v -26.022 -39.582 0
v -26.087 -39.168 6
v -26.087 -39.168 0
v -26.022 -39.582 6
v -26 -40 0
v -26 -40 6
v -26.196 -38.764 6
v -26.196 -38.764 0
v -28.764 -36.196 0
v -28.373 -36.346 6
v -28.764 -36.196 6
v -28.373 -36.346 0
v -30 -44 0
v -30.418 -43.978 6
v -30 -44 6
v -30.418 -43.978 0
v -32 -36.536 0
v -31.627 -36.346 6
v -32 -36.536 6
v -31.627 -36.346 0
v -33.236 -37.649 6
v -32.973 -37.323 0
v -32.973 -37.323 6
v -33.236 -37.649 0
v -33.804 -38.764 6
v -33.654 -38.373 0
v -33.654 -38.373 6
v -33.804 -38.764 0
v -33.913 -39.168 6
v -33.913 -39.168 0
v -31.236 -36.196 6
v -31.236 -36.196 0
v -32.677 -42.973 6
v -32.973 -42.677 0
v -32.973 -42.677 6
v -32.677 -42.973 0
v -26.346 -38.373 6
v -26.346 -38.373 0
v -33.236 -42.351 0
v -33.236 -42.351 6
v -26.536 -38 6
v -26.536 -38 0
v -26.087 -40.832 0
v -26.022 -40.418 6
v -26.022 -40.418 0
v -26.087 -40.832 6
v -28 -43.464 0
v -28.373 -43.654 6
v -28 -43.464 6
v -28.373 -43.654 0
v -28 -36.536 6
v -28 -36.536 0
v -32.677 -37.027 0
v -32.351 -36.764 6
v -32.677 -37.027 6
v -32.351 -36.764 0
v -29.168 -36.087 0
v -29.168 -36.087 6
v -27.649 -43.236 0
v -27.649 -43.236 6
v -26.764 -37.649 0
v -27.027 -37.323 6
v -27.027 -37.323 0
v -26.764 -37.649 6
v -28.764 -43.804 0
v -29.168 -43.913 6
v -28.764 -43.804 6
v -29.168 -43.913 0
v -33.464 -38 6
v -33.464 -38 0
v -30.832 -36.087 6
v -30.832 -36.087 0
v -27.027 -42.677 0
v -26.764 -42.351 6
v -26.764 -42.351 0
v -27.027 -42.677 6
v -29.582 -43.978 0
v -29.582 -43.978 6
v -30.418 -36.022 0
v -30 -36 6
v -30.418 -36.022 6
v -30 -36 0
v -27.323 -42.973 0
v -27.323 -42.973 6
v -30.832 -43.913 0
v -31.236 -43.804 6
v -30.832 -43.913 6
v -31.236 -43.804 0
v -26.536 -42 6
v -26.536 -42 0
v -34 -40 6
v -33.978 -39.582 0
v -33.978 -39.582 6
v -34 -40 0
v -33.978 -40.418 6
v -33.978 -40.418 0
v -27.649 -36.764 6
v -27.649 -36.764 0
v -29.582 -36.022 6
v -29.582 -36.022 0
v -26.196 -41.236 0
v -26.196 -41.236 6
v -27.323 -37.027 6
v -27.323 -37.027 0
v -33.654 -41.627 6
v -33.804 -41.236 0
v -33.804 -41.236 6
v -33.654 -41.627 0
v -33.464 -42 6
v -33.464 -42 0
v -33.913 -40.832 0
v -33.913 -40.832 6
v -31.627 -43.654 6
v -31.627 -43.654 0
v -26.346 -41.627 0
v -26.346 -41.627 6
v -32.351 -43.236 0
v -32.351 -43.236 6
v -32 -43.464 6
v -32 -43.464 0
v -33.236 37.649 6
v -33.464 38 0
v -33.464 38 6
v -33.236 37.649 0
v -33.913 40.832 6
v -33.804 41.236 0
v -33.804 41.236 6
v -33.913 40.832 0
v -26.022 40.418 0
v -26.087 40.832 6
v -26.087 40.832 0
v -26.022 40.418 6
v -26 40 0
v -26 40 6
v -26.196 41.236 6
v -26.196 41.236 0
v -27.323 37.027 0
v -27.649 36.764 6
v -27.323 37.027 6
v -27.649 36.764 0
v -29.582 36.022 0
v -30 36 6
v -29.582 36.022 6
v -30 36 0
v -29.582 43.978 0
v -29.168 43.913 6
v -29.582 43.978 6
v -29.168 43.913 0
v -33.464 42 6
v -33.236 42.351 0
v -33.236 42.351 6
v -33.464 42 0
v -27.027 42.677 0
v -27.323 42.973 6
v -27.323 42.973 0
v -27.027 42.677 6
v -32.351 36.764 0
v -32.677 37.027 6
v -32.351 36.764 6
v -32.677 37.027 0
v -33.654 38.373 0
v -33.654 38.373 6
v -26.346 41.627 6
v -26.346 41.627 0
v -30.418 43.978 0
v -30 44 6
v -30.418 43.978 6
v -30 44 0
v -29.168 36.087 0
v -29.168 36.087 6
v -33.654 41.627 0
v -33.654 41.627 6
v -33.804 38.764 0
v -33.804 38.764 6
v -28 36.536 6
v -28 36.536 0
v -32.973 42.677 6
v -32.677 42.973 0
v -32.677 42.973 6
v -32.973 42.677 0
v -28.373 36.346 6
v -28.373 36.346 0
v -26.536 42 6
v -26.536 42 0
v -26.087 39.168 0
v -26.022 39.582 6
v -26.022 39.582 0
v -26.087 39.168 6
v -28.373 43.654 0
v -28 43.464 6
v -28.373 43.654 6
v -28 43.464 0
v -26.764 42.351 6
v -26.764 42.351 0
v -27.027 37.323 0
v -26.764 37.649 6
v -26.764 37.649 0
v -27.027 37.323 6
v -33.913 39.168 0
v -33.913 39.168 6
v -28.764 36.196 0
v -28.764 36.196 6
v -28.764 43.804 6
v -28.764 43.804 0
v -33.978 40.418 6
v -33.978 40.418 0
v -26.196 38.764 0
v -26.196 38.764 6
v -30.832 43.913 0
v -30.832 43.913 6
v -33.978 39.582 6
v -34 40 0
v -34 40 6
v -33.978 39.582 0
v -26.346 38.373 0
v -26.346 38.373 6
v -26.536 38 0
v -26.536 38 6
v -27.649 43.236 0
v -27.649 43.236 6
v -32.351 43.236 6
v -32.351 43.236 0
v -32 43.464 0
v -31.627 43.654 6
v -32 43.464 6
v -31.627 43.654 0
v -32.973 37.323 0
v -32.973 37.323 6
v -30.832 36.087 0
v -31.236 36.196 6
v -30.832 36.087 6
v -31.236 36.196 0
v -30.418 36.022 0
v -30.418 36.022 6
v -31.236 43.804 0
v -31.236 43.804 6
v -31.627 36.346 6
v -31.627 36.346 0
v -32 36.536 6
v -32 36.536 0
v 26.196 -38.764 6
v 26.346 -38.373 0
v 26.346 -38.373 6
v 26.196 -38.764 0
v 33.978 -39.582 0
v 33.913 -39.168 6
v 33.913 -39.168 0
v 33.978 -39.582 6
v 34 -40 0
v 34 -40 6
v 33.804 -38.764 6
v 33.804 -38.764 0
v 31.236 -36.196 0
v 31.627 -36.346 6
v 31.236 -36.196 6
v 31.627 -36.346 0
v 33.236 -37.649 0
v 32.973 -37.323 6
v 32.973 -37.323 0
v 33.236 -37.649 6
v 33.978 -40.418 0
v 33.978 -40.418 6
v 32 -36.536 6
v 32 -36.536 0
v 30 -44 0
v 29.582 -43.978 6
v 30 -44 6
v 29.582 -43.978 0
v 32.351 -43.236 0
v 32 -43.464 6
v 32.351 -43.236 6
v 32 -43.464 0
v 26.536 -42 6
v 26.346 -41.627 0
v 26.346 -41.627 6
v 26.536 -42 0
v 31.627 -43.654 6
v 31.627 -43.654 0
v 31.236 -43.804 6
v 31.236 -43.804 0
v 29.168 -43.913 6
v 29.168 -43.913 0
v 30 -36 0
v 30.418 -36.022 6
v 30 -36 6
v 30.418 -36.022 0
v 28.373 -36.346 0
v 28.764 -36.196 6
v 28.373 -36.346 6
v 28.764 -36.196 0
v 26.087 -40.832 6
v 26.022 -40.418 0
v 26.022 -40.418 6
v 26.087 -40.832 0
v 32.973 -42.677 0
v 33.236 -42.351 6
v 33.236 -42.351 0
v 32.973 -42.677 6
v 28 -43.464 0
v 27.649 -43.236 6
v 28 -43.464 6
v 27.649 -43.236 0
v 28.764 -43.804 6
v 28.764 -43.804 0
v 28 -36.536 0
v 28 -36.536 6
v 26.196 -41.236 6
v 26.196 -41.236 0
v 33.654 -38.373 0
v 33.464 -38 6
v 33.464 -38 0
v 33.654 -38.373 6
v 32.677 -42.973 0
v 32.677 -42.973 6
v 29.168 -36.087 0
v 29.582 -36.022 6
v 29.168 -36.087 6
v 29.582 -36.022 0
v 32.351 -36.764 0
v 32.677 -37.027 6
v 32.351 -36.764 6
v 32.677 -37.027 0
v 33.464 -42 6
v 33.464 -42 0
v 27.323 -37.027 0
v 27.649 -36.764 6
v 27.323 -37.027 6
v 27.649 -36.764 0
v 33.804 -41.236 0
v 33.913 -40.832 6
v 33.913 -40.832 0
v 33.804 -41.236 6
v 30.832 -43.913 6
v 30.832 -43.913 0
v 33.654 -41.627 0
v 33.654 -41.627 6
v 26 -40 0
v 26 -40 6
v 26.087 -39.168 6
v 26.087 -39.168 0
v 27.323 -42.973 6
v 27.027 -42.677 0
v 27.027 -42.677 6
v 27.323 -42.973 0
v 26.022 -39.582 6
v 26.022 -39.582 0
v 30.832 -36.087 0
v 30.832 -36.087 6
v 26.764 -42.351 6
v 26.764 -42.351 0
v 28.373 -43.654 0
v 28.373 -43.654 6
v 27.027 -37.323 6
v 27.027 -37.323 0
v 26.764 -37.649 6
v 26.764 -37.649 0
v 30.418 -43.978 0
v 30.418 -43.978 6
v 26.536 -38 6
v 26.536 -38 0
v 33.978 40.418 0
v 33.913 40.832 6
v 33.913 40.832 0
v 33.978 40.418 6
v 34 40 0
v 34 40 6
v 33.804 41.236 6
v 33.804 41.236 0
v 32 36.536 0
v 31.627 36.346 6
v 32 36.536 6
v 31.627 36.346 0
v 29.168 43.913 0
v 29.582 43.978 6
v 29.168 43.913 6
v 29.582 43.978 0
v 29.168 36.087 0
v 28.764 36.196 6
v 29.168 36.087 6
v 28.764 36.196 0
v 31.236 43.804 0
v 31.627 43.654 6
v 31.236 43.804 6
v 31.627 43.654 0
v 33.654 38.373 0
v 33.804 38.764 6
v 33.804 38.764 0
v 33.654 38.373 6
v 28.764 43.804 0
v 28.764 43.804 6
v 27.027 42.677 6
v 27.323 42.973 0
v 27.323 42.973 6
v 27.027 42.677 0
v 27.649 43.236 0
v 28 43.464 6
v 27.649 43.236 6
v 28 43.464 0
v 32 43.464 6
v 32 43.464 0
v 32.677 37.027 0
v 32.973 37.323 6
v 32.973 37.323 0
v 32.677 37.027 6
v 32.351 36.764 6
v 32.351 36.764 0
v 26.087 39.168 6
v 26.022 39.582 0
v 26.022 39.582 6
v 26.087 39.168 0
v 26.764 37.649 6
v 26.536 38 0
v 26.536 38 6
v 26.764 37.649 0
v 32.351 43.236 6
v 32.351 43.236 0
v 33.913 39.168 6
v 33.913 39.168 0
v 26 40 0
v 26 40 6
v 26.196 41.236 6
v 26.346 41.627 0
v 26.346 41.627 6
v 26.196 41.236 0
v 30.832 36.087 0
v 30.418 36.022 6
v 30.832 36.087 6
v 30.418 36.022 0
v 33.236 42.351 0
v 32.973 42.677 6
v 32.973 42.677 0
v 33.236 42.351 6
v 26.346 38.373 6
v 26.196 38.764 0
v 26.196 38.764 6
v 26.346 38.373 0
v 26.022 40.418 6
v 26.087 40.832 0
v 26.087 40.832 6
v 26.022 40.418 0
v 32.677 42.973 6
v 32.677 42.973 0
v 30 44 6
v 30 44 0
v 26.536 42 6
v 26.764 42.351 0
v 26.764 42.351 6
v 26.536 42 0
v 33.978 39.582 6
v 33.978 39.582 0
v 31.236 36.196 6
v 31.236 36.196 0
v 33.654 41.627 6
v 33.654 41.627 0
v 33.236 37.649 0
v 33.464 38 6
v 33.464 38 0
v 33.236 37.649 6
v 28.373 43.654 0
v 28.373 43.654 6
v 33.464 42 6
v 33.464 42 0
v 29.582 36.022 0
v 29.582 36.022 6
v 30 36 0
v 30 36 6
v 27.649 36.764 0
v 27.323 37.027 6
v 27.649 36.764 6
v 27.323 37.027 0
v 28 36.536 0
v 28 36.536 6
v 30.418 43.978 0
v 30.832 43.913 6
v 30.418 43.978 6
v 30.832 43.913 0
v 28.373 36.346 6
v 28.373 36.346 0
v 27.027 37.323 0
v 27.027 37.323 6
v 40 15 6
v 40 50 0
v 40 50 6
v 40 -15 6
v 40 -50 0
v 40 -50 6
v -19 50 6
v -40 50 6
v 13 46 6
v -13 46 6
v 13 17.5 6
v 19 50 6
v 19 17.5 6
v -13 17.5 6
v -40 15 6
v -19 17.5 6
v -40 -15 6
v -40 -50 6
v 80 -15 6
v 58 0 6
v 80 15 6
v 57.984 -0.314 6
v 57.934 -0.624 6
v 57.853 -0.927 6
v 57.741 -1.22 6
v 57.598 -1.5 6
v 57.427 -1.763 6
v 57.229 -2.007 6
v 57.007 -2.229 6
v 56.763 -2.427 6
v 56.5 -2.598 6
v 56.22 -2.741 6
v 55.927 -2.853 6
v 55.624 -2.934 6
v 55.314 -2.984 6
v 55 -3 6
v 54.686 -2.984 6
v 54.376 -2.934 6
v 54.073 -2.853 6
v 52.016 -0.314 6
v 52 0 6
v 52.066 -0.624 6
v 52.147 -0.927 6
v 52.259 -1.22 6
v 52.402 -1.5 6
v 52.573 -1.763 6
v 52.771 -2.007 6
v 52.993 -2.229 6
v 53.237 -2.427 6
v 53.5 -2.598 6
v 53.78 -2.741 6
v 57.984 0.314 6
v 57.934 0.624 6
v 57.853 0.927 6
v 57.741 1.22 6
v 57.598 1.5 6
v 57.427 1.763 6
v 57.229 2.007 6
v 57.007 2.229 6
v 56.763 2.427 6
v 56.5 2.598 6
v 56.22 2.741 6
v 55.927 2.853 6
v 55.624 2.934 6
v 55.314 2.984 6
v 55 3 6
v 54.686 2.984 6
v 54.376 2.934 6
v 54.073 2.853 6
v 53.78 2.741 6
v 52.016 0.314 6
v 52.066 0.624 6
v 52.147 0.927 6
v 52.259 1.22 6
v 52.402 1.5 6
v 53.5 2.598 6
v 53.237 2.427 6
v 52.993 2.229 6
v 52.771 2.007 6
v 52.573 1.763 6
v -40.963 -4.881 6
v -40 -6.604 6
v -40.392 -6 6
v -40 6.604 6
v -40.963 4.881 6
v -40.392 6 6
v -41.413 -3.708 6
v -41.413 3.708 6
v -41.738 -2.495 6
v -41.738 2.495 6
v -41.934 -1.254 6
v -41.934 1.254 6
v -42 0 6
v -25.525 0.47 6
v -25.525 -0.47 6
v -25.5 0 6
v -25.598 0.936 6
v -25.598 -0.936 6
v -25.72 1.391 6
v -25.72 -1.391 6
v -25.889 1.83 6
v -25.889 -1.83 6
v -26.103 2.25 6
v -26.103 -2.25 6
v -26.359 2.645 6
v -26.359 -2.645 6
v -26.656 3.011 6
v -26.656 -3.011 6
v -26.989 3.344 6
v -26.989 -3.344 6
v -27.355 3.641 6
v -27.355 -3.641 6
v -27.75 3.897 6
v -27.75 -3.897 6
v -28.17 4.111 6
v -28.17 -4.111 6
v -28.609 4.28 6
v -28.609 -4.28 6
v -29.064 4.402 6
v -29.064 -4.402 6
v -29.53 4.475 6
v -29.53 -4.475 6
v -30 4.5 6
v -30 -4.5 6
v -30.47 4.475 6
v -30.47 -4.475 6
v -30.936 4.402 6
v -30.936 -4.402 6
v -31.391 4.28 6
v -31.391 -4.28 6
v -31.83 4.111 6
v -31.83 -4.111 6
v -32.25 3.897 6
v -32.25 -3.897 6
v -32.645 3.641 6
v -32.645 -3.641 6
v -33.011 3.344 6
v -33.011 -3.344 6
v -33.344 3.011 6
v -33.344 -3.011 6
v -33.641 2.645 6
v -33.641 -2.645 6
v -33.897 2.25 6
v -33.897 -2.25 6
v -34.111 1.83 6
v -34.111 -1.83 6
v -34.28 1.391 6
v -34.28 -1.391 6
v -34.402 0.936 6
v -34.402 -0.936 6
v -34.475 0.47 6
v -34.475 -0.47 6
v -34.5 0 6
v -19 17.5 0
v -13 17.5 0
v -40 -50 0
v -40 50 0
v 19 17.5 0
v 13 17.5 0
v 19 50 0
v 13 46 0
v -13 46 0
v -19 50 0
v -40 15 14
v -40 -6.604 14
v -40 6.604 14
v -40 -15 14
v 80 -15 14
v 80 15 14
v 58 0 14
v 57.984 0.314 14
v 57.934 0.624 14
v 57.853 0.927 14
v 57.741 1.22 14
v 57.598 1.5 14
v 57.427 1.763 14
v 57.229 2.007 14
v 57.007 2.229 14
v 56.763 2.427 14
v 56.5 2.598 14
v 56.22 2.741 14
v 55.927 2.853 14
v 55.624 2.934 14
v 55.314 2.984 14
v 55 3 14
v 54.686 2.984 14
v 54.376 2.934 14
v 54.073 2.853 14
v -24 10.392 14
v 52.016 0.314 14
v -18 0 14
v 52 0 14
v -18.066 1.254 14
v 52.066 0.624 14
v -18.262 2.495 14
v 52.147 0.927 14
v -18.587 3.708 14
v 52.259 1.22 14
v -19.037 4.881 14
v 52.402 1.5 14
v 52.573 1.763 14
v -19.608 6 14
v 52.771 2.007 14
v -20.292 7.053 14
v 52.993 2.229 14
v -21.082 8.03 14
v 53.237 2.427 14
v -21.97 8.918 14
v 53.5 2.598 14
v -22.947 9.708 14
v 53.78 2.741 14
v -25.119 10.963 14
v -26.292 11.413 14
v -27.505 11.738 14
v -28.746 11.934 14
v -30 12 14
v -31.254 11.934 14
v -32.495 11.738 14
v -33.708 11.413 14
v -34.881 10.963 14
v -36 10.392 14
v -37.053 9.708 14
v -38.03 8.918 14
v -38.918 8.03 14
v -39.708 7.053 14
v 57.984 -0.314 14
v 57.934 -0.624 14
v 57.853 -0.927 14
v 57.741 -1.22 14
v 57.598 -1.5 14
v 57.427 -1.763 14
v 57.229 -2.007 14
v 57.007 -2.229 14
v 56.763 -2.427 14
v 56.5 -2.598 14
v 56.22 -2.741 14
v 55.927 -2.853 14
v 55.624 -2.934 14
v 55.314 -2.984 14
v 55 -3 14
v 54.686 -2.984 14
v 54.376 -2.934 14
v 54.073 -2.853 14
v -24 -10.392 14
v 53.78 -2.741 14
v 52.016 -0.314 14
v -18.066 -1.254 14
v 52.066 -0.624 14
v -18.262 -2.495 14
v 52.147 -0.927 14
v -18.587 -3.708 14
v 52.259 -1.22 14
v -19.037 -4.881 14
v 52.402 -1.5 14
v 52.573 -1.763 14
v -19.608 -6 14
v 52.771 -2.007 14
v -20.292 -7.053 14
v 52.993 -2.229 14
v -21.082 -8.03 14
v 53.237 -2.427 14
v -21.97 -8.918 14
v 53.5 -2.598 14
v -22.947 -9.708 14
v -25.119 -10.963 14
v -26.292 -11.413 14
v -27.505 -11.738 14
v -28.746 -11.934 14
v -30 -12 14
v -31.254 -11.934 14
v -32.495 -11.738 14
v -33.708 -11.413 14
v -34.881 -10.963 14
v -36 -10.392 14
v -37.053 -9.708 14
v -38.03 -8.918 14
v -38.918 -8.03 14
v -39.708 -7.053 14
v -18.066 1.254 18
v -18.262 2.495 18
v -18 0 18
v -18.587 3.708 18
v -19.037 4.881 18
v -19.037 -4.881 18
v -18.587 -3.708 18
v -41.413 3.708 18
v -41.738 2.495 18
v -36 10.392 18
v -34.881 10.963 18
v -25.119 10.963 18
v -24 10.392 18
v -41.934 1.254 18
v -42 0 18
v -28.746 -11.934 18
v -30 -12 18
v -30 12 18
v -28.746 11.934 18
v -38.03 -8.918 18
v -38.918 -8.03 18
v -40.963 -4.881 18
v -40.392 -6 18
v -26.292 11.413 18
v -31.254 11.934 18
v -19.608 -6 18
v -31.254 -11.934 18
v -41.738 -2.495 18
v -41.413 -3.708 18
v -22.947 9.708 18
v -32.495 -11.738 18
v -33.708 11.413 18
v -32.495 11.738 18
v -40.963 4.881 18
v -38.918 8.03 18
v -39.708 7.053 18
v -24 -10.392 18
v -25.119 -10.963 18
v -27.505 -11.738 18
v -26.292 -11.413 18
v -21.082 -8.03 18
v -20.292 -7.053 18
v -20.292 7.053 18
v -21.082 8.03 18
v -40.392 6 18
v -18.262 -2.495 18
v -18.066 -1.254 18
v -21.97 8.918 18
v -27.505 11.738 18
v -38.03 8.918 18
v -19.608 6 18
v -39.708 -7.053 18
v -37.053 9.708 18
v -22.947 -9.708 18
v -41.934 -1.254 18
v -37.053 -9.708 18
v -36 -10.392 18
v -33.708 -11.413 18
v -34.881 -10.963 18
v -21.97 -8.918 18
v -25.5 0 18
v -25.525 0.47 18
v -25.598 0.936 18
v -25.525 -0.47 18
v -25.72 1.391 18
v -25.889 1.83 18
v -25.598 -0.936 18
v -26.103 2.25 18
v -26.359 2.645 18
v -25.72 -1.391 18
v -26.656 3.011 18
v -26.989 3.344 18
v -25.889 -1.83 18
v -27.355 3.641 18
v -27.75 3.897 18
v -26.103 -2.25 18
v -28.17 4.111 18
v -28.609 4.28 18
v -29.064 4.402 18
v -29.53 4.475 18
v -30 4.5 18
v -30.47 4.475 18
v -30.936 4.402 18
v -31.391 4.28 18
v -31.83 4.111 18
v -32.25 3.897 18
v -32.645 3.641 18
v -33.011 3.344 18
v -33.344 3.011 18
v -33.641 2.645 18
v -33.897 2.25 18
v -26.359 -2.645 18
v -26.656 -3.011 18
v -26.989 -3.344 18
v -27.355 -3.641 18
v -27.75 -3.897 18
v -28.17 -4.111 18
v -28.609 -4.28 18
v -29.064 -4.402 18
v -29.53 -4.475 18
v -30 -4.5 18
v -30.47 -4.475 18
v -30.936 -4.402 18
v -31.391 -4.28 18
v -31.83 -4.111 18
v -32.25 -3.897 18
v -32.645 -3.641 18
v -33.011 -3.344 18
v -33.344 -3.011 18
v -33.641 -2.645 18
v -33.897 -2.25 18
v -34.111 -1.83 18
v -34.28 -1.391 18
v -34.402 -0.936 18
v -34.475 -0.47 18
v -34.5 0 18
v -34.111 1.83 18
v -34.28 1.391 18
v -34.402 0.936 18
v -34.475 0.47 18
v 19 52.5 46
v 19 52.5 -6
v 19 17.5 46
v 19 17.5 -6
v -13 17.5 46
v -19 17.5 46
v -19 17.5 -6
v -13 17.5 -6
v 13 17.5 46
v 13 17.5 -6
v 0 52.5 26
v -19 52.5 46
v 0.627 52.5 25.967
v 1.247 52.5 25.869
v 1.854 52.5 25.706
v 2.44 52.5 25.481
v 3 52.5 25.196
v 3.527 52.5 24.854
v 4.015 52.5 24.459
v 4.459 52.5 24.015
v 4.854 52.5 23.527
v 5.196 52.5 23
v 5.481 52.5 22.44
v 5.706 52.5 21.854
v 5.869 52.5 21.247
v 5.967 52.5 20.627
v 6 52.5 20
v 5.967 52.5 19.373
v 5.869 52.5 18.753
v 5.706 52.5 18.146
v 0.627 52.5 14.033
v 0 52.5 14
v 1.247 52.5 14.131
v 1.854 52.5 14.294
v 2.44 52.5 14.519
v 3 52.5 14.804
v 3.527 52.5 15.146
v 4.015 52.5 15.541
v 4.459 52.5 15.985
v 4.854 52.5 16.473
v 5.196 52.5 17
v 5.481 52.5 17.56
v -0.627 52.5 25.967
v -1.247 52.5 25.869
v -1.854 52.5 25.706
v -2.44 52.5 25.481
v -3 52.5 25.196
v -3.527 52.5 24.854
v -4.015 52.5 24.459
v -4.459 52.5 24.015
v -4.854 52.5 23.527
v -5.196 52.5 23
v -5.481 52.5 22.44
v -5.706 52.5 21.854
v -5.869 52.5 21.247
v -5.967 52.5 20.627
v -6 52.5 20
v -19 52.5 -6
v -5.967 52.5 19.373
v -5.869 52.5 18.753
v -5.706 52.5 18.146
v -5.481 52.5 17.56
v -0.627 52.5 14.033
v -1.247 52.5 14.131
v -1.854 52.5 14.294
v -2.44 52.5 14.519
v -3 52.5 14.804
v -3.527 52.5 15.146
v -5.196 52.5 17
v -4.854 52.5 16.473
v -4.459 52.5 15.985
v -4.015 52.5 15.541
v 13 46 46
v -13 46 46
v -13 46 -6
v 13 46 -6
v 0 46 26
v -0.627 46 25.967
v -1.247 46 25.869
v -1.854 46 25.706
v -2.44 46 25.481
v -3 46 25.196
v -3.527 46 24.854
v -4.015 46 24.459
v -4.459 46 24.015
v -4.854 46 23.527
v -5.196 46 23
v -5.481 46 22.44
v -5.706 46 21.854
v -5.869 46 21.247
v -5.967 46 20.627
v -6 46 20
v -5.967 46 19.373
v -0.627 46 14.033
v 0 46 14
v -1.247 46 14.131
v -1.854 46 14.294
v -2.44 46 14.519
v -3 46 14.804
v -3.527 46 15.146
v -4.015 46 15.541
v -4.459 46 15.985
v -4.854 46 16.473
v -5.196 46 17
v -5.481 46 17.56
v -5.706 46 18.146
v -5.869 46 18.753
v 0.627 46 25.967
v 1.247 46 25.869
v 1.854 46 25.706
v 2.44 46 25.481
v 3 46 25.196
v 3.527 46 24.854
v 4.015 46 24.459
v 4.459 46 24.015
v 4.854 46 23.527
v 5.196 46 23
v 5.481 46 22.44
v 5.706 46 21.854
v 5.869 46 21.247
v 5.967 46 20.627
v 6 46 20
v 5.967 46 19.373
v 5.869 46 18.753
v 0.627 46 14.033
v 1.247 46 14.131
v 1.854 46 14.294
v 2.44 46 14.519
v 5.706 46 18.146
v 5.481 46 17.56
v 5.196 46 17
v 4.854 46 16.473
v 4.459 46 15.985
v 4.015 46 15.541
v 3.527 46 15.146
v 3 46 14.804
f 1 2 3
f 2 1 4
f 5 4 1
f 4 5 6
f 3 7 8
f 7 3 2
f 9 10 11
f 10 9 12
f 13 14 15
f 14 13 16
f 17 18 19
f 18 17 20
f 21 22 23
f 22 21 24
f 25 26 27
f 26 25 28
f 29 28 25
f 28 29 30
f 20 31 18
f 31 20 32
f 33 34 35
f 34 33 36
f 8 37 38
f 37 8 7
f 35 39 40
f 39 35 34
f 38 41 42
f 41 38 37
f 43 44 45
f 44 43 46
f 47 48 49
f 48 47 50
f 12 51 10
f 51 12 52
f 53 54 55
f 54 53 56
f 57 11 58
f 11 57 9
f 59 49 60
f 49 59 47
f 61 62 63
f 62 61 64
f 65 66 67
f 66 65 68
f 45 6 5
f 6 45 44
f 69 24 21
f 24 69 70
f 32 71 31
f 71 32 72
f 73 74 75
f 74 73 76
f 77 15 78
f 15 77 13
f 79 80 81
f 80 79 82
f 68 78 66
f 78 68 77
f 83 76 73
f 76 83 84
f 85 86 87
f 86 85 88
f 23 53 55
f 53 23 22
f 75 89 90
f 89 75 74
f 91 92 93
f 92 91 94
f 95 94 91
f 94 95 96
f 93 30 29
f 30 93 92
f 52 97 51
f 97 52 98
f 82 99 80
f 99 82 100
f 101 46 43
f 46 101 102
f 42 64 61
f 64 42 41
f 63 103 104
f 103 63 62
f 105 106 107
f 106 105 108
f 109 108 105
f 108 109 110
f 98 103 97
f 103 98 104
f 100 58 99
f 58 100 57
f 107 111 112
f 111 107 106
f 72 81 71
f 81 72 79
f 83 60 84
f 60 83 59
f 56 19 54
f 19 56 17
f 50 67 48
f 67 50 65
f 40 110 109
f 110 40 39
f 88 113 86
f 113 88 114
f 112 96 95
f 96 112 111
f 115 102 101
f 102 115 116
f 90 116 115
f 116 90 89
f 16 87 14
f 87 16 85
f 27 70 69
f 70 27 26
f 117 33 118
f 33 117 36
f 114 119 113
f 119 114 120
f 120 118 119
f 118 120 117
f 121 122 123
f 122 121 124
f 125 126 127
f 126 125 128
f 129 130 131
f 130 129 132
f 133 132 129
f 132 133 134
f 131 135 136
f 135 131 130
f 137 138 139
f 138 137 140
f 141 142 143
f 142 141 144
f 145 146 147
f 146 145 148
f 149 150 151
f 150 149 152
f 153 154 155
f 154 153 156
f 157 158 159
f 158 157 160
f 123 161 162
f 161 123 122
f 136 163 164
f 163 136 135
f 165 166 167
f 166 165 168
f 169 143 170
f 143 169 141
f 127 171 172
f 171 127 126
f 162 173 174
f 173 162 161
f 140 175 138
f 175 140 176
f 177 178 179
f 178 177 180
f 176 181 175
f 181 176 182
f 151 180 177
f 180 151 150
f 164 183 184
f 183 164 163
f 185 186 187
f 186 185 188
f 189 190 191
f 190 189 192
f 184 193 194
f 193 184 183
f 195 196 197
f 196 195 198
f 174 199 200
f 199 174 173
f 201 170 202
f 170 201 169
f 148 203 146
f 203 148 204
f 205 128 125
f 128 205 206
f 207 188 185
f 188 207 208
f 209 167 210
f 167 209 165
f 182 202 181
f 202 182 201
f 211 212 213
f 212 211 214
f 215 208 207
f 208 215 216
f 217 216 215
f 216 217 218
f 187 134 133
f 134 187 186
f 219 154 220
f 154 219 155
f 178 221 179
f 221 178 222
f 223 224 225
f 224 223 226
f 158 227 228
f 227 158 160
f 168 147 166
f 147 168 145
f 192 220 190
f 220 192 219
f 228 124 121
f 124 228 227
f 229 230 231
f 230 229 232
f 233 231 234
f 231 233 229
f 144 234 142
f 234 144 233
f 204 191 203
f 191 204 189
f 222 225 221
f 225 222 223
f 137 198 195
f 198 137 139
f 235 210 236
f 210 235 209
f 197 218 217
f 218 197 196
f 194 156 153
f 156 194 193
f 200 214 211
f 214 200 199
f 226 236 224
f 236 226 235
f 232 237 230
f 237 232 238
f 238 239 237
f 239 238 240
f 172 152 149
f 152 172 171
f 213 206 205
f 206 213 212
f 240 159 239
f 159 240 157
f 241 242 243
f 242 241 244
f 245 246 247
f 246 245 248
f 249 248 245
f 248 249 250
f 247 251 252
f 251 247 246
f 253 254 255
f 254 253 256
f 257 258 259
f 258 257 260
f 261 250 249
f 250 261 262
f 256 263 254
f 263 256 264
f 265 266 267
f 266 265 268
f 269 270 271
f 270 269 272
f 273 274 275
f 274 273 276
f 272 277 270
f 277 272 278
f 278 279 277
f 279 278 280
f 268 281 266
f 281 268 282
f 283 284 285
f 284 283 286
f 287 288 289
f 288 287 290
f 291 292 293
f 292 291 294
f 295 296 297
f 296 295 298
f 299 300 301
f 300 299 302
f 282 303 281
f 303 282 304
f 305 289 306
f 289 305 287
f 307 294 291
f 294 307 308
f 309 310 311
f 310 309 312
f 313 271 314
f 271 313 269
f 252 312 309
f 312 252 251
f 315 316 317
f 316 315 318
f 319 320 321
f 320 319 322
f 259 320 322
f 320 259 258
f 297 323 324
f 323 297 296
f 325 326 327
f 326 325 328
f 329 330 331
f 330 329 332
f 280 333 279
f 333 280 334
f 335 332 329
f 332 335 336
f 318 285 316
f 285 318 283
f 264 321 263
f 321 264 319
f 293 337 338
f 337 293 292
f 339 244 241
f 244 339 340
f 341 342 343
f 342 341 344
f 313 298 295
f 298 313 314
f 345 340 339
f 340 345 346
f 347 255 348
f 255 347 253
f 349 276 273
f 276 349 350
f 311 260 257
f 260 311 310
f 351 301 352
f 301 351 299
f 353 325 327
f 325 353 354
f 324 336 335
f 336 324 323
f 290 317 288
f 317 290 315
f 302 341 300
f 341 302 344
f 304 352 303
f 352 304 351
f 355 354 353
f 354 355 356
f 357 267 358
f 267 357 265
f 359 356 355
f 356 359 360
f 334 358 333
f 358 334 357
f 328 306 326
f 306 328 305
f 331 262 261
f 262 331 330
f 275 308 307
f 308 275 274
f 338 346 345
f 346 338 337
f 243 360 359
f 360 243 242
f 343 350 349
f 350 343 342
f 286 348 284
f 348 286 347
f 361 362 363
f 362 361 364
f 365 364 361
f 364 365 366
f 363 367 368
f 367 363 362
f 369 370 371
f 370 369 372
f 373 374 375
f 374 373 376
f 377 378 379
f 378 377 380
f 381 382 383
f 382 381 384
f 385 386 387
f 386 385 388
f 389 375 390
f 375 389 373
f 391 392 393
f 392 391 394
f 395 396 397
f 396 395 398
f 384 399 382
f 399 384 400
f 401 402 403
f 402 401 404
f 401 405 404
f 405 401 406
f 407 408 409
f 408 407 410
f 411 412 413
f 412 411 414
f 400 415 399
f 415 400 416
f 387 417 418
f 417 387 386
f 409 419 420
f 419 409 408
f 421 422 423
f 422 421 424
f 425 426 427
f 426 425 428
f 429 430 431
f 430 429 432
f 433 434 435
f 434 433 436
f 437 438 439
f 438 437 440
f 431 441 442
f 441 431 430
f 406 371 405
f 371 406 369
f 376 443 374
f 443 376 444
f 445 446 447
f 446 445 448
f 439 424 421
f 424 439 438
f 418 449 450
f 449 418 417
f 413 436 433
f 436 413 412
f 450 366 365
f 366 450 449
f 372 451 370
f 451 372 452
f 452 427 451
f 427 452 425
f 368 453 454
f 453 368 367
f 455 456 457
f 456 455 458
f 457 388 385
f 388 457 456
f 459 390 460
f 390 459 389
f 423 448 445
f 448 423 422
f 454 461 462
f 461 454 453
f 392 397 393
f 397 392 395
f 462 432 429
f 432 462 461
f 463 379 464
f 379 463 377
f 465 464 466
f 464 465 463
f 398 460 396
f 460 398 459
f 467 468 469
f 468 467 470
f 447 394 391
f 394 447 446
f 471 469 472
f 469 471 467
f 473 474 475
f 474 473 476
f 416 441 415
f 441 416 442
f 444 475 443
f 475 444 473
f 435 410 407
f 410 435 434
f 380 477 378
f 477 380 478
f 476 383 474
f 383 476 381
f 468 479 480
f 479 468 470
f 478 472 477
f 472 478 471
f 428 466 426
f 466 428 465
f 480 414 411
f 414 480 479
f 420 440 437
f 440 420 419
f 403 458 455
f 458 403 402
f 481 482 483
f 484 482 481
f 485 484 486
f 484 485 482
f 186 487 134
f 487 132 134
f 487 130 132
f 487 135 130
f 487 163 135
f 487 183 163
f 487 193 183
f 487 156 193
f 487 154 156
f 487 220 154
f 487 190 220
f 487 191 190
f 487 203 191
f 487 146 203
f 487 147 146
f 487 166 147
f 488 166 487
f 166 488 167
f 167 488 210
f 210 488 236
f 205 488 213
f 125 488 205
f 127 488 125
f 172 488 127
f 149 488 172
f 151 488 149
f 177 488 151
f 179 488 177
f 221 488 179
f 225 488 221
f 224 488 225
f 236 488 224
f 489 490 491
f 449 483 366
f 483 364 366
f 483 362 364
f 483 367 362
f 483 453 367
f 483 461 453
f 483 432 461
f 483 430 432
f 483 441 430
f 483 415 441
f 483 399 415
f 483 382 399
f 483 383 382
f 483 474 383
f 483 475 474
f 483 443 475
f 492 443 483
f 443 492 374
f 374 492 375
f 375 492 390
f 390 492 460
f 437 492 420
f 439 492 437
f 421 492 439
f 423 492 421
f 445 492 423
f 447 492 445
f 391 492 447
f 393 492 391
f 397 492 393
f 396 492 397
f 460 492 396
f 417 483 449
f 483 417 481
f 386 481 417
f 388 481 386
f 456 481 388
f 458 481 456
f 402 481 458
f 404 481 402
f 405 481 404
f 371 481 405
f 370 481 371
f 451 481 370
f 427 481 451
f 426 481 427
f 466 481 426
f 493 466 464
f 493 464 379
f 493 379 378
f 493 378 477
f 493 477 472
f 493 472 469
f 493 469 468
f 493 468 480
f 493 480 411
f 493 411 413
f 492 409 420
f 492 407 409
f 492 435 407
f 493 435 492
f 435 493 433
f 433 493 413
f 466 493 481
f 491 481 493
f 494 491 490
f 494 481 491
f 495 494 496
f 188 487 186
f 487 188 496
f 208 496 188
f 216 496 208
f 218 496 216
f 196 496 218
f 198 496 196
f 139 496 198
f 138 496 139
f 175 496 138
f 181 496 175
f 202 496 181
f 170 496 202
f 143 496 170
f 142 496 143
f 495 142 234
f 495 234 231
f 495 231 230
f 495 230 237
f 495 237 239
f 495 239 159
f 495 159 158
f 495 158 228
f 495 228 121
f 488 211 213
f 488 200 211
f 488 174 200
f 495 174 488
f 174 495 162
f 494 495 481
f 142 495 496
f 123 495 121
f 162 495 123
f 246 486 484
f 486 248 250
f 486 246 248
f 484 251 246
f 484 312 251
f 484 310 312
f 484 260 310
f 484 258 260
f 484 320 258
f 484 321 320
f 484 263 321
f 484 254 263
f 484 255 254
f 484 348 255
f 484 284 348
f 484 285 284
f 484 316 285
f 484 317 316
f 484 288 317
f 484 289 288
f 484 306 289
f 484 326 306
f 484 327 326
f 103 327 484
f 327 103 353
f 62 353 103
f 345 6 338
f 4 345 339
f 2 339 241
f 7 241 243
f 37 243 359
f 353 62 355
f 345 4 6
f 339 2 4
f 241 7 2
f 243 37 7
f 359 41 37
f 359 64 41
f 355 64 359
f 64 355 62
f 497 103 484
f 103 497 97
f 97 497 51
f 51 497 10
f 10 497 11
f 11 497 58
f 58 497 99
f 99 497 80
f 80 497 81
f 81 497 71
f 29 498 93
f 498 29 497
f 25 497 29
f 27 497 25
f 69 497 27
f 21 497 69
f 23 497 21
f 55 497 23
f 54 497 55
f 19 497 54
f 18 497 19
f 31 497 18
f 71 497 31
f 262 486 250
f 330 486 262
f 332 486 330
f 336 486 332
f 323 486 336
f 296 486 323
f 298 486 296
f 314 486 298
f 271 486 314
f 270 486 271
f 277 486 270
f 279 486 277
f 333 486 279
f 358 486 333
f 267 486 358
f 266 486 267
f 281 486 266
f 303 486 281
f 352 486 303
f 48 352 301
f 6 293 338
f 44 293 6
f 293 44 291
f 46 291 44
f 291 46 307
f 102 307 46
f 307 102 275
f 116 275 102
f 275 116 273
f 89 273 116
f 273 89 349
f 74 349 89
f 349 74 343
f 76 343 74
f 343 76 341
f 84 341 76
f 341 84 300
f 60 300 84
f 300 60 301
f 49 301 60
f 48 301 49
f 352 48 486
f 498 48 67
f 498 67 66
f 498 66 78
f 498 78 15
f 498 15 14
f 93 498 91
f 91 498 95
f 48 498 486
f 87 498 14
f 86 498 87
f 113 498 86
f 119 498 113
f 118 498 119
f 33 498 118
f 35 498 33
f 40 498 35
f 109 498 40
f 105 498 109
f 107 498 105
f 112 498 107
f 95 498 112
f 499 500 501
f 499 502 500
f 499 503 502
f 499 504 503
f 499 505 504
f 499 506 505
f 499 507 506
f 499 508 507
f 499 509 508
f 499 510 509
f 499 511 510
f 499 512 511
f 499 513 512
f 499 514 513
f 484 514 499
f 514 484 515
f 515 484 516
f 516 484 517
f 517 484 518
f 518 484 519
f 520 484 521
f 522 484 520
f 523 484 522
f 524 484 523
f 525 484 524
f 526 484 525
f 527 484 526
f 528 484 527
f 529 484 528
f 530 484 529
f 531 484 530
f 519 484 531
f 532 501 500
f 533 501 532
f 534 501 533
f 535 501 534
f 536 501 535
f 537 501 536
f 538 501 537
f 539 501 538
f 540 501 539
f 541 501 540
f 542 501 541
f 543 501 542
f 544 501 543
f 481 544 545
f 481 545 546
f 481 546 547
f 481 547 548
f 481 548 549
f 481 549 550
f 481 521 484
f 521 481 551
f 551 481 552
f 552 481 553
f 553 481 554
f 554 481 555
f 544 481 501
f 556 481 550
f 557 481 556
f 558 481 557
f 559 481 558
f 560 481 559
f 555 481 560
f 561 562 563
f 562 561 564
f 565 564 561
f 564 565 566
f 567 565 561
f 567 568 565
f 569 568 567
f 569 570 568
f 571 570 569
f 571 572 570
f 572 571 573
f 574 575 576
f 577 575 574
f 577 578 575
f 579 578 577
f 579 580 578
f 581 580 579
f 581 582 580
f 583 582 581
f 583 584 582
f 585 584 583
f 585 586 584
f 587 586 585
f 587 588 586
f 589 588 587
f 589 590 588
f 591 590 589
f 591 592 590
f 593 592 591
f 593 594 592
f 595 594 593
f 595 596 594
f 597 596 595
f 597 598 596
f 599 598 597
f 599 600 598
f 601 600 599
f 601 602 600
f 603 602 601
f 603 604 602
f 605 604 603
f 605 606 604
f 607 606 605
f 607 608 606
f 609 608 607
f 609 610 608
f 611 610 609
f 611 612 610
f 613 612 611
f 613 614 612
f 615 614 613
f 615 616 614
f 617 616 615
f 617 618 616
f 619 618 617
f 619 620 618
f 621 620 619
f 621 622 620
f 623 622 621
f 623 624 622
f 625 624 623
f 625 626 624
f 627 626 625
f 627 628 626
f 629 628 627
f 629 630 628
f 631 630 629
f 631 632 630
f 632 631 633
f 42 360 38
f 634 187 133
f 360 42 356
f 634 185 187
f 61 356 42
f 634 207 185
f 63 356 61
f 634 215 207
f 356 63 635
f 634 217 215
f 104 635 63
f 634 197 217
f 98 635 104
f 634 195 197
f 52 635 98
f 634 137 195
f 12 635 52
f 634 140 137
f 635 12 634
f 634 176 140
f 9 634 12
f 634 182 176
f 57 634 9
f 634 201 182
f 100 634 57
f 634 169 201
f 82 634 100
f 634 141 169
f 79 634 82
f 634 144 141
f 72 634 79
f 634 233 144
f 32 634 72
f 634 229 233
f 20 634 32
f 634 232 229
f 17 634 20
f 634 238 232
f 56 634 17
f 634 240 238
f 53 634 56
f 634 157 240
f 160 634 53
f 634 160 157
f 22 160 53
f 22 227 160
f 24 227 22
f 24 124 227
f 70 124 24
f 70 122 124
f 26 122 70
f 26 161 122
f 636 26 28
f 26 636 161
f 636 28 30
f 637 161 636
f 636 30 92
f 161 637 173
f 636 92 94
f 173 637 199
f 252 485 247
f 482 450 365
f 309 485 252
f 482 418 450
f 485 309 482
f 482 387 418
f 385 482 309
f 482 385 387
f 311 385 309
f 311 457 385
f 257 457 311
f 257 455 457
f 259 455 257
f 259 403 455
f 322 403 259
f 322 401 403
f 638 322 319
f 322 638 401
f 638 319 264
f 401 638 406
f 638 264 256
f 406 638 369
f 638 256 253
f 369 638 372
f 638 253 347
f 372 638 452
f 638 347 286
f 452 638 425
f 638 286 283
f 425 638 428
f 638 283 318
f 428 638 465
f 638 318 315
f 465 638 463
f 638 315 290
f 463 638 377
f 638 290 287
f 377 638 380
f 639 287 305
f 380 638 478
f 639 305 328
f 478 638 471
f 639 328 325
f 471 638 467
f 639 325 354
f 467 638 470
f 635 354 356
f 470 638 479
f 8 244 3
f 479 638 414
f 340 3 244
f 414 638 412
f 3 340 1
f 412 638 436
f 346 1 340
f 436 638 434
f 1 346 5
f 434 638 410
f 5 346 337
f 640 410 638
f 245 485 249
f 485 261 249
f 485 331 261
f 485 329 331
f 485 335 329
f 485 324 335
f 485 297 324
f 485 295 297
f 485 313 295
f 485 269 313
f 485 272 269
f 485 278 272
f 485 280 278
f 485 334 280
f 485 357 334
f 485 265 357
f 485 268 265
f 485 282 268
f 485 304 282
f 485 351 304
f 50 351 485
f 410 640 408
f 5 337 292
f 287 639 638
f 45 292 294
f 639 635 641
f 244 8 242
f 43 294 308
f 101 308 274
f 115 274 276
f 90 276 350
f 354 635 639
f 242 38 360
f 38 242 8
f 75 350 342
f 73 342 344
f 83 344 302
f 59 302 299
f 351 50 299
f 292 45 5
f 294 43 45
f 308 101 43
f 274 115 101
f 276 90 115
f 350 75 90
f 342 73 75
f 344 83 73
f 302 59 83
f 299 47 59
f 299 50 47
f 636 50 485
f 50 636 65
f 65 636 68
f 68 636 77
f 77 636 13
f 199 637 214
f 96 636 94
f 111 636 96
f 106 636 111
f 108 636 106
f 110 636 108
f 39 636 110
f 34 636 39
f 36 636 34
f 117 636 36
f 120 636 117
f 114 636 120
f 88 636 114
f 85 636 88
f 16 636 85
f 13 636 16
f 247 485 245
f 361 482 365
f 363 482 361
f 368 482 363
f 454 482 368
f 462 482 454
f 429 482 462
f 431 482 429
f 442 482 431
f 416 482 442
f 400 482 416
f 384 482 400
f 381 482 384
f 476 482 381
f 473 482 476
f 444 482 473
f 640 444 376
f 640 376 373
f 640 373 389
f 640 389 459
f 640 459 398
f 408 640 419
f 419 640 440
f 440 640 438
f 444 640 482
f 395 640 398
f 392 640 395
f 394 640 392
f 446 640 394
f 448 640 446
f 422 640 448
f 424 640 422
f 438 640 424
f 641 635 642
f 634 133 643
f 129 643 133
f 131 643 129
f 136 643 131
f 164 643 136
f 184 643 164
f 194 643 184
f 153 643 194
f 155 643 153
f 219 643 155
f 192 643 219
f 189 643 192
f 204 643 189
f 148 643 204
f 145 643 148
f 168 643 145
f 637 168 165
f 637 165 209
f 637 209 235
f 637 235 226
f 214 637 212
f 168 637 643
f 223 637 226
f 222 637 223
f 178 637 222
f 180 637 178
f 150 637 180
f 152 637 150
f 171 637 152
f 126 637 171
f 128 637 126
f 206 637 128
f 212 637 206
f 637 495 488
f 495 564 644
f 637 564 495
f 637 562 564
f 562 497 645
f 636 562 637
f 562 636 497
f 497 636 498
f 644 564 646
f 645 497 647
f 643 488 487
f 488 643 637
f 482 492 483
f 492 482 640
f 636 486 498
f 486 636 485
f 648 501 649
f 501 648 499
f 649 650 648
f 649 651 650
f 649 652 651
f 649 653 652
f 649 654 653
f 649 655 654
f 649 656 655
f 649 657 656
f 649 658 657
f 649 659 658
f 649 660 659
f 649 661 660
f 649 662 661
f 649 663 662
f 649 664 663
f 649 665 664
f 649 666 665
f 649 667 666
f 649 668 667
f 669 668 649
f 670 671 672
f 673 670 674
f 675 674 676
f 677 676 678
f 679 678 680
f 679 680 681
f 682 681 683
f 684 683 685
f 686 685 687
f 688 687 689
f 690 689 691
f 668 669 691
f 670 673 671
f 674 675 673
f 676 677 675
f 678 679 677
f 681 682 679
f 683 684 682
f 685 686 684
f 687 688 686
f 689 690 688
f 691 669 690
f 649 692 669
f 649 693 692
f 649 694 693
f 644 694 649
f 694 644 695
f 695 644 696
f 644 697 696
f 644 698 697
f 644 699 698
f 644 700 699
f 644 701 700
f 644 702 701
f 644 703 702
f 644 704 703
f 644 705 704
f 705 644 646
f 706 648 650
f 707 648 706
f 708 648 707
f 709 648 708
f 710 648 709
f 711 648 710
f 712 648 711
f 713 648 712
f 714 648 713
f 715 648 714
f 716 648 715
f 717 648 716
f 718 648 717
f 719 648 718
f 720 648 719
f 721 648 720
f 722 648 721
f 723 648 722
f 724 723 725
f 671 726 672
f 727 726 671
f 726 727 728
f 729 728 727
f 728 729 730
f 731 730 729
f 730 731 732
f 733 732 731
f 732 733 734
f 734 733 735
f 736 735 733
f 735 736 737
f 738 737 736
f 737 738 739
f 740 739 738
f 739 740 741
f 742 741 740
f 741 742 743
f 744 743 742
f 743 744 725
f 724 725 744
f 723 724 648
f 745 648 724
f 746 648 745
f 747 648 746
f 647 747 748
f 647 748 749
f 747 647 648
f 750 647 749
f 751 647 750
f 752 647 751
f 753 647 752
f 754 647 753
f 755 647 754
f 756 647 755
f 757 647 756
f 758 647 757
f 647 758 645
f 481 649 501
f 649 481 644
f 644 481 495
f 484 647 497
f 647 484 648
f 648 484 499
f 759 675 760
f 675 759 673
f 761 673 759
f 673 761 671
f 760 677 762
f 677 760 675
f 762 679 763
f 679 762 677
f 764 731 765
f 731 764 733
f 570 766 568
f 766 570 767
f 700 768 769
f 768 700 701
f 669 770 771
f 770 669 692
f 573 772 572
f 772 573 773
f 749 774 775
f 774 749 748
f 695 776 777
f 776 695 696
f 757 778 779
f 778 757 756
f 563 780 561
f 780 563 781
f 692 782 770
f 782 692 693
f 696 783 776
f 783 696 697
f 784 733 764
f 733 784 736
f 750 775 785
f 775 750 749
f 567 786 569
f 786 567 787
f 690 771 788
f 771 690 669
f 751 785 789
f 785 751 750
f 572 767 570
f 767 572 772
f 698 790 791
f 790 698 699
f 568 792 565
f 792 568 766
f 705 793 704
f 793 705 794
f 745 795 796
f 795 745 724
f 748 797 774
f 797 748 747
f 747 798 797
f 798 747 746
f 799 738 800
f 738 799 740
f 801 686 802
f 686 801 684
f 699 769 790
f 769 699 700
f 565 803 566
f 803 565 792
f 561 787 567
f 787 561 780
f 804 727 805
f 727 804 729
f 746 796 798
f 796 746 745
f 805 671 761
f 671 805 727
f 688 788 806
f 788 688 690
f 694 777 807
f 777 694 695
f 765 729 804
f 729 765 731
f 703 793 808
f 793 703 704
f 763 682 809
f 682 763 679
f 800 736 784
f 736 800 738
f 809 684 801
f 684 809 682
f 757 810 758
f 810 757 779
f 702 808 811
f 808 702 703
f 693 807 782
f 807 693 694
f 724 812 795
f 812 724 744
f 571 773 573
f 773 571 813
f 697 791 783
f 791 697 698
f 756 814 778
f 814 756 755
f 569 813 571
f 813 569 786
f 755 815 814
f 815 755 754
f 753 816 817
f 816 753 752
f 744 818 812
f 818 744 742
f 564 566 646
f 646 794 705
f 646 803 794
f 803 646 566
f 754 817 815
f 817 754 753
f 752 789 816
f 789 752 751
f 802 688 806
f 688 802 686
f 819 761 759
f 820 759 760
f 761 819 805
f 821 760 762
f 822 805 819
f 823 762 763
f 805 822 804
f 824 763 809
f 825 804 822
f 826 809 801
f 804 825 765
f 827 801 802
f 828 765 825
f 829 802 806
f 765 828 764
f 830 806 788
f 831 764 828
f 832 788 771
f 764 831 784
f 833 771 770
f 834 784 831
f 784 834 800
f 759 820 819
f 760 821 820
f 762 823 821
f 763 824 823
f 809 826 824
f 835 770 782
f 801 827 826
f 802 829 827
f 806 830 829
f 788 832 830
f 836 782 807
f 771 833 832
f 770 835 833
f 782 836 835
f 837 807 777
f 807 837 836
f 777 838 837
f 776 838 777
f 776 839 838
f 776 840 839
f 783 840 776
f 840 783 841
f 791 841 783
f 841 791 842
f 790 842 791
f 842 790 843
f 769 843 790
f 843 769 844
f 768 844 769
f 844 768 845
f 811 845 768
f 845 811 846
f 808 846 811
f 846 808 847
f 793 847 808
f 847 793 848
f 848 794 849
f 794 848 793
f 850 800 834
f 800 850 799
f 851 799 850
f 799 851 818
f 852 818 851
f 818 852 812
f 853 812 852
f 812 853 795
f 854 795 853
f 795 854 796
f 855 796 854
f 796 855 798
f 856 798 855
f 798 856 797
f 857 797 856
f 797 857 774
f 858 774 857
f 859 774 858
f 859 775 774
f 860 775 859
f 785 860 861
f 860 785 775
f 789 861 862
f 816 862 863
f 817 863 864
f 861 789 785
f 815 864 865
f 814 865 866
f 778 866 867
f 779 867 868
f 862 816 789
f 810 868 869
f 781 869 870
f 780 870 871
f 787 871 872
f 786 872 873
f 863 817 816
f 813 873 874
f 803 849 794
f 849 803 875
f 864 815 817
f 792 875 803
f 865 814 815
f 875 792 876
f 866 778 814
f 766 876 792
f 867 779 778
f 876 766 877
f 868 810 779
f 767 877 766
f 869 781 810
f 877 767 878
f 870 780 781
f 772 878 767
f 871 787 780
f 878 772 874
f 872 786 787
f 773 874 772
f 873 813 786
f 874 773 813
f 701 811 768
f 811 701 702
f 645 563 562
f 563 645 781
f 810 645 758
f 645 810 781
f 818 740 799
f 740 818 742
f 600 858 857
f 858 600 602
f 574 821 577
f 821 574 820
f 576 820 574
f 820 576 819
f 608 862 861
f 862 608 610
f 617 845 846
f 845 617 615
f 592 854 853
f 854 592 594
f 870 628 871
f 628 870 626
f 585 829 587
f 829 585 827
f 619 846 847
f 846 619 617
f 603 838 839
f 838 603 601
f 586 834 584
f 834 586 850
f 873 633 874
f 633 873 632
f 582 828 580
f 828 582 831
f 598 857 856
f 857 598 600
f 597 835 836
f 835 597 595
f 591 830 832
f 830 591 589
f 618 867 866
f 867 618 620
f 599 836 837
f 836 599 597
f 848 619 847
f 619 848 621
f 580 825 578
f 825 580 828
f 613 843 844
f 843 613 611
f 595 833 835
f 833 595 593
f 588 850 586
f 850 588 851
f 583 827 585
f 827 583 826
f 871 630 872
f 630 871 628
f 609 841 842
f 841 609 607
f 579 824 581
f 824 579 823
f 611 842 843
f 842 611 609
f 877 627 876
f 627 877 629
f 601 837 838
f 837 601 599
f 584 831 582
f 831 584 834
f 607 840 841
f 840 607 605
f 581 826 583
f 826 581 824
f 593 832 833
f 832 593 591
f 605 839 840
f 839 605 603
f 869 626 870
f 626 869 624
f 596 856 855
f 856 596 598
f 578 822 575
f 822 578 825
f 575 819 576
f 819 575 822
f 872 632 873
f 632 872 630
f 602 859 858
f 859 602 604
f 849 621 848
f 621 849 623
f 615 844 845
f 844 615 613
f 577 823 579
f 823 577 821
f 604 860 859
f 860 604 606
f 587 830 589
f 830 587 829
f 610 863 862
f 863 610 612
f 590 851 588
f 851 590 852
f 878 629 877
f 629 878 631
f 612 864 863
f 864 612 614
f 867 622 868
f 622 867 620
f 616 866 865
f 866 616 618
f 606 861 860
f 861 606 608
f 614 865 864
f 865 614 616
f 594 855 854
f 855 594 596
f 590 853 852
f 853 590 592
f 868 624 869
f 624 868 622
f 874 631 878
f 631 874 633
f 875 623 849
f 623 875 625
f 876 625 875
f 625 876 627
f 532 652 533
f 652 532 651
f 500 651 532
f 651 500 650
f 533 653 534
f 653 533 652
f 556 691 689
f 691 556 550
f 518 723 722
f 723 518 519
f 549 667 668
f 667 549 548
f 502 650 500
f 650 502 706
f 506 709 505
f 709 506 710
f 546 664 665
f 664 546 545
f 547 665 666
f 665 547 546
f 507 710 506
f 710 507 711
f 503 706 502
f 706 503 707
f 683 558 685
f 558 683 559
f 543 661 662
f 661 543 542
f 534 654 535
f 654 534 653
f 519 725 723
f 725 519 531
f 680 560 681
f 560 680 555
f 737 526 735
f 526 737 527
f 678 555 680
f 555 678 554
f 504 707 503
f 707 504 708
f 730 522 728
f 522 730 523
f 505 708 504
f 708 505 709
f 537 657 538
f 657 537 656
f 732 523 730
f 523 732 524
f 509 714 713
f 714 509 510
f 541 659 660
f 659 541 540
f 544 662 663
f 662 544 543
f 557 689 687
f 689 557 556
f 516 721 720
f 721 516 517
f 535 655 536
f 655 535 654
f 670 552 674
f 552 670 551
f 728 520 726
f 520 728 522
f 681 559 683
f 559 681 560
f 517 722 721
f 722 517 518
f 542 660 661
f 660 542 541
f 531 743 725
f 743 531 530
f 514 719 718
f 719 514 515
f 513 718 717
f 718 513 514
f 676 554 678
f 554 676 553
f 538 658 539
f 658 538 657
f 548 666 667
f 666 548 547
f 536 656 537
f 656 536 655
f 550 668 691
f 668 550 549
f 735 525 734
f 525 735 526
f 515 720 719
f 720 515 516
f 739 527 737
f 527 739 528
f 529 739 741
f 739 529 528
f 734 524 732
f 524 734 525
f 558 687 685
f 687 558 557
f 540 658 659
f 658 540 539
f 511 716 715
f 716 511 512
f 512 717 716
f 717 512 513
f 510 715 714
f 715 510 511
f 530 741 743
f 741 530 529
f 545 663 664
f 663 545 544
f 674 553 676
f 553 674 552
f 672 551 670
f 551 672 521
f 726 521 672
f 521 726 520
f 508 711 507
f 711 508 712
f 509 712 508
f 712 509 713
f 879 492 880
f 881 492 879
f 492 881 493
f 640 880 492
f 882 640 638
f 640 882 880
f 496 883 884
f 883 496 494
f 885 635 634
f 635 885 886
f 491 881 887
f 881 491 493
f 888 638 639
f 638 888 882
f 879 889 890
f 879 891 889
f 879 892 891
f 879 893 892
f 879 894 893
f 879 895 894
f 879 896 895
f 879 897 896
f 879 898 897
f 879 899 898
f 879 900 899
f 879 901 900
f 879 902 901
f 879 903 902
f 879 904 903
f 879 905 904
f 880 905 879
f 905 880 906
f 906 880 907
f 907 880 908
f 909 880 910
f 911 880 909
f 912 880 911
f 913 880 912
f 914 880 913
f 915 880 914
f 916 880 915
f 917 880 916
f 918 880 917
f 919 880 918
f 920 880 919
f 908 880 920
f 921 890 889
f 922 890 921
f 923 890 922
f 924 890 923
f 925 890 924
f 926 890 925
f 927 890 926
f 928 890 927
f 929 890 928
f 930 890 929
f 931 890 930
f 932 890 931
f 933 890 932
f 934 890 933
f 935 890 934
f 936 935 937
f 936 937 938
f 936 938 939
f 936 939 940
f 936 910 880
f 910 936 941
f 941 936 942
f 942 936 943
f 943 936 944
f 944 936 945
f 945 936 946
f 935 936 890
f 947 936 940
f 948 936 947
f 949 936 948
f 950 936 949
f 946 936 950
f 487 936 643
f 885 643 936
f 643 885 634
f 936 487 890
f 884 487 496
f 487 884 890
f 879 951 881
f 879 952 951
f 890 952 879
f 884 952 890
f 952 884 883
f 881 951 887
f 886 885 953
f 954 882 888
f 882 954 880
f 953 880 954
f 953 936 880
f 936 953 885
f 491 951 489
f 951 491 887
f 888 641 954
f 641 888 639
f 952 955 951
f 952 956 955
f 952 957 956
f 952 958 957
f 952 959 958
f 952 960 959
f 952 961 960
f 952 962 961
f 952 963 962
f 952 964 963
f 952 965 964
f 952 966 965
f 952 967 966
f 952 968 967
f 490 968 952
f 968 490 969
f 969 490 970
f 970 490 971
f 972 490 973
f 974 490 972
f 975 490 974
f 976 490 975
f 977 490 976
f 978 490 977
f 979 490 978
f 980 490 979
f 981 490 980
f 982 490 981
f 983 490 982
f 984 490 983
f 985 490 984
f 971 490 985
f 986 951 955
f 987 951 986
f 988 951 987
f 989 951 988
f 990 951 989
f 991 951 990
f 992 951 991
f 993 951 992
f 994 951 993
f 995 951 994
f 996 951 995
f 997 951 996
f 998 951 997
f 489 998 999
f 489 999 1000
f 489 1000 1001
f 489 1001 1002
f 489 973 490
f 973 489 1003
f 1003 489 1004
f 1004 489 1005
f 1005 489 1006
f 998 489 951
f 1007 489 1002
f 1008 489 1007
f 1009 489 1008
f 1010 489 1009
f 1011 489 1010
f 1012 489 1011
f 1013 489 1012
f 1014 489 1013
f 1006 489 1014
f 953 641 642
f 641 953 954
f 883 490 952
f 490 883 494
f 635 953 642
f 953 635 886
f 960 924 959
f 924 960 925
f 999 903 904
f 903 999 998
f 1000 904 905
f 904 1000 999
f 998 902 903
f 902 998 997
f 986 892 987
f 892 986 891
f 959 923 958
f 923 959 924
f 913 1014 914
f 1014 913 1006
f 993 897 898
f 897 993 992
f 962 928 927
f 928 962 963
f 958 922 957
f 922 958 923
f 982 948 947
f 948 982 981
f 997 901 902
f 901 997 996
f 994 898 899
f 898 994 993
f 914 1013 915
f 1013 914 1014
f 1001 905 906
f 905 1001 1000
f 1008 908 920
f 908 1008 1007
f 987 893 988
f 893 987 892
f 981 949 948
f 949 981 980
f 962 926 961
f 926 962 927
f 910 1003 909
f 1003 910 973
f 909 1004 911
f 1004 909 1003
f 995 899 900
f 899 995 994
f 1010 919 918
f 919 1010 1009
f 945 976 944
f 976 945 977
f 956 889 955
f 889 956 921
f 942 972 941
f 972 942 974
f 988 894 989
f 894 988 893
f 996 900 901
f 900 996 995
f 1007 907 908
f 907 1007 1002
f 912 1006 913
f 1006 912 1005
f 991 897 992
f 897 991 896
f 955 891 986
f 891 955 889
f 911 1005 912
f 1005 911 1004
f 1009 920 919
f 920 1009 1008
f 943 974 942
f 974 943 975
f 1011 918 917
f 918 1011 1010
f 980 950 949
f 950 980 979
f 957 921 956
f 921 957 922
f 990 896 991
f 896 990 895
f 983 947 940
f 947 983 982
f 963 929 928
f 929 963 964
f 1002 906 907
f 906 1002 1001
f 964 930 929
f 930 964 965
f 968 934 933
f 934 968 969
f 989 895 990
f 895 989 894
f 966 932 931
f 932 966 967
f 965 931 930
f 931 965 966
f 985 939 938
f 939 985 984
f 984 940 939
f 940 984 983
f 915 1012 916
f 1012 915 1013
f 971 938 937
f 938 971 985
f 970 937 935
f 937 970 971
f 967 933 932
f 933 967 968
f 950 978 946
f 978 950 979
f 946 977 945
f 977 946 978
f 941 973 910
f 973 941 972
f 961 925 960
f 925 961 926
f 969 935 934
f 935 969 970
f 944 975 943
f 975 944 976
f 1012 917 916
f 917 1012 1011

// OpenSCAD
// UNIVAC IX / RT Smart Farm Mechanical Device: Gravity Latch & Solenoid Bracket
// Designed for mounting on NDSU/LSU Standard Wood Post & Stud Frames

$fn = 60;
latch_length = 120;
latch_width = 30;
latch_thickness = 8;
solenoid_pocket_w = 26;
solenoid_pocket_l = 40;

module wood_mounting_plate() {
    difference() {
        // Base plate for wood screws
        cube([80, 100, 6], center=true);
        // 4x Mounting holes for heavy-duty timber screws
        for (x=[-30, 30], y=[-40, 40]) {
            translate([x, y, 0]) cylinder(h=12, r=4, center=true);
        }
    }
}

module gravity_latch_arm() {
    difference() {
        union() {
            cube([latch_length, latch_width, latch_thickness], center=false);
            // Pivot housing
            translate([10, latch_width/2, 0]) cylinder(h=latch_thickness+4, r=12, center=false);
        }
        // Pivot bolt hole (Snake-eyes tamper-resistant spanner bolt ready)
        translate([10, latch_width/2, -1]) cylinder(h=20, r=4.5, center=false);
        // Solenoid linkages slot
        translate([latch_length-25, latch_width/2, -1]) cylinder(h=20, r=3, center=false);
    }
}

module solenoid_housing_bracket() {
    // Rigid cradle for the electronic release actuator
    difference() {
        cube([solenoid_pocket_w + 12, solenoid_pocket_l + 12, 35], center=true);
        translate([0, 0, 4]) cube([solenoid_pocket_w, solenoid_pocket_l + 14, 30], center=true);
        // Plunger shaft clearance hole
        translate([0, 0, -15]) cylinder(h=20, r=6, center=true);
    }
}

// Assemble the smart mechanism
translate([0, 0, 3]) wood_mounting_plate();
translate([-40, -15, 6]) gravity_latch_arm();
translate([0, 35, 20]) rotate([90, 0, 0]) solenoid_housing_bracket();
